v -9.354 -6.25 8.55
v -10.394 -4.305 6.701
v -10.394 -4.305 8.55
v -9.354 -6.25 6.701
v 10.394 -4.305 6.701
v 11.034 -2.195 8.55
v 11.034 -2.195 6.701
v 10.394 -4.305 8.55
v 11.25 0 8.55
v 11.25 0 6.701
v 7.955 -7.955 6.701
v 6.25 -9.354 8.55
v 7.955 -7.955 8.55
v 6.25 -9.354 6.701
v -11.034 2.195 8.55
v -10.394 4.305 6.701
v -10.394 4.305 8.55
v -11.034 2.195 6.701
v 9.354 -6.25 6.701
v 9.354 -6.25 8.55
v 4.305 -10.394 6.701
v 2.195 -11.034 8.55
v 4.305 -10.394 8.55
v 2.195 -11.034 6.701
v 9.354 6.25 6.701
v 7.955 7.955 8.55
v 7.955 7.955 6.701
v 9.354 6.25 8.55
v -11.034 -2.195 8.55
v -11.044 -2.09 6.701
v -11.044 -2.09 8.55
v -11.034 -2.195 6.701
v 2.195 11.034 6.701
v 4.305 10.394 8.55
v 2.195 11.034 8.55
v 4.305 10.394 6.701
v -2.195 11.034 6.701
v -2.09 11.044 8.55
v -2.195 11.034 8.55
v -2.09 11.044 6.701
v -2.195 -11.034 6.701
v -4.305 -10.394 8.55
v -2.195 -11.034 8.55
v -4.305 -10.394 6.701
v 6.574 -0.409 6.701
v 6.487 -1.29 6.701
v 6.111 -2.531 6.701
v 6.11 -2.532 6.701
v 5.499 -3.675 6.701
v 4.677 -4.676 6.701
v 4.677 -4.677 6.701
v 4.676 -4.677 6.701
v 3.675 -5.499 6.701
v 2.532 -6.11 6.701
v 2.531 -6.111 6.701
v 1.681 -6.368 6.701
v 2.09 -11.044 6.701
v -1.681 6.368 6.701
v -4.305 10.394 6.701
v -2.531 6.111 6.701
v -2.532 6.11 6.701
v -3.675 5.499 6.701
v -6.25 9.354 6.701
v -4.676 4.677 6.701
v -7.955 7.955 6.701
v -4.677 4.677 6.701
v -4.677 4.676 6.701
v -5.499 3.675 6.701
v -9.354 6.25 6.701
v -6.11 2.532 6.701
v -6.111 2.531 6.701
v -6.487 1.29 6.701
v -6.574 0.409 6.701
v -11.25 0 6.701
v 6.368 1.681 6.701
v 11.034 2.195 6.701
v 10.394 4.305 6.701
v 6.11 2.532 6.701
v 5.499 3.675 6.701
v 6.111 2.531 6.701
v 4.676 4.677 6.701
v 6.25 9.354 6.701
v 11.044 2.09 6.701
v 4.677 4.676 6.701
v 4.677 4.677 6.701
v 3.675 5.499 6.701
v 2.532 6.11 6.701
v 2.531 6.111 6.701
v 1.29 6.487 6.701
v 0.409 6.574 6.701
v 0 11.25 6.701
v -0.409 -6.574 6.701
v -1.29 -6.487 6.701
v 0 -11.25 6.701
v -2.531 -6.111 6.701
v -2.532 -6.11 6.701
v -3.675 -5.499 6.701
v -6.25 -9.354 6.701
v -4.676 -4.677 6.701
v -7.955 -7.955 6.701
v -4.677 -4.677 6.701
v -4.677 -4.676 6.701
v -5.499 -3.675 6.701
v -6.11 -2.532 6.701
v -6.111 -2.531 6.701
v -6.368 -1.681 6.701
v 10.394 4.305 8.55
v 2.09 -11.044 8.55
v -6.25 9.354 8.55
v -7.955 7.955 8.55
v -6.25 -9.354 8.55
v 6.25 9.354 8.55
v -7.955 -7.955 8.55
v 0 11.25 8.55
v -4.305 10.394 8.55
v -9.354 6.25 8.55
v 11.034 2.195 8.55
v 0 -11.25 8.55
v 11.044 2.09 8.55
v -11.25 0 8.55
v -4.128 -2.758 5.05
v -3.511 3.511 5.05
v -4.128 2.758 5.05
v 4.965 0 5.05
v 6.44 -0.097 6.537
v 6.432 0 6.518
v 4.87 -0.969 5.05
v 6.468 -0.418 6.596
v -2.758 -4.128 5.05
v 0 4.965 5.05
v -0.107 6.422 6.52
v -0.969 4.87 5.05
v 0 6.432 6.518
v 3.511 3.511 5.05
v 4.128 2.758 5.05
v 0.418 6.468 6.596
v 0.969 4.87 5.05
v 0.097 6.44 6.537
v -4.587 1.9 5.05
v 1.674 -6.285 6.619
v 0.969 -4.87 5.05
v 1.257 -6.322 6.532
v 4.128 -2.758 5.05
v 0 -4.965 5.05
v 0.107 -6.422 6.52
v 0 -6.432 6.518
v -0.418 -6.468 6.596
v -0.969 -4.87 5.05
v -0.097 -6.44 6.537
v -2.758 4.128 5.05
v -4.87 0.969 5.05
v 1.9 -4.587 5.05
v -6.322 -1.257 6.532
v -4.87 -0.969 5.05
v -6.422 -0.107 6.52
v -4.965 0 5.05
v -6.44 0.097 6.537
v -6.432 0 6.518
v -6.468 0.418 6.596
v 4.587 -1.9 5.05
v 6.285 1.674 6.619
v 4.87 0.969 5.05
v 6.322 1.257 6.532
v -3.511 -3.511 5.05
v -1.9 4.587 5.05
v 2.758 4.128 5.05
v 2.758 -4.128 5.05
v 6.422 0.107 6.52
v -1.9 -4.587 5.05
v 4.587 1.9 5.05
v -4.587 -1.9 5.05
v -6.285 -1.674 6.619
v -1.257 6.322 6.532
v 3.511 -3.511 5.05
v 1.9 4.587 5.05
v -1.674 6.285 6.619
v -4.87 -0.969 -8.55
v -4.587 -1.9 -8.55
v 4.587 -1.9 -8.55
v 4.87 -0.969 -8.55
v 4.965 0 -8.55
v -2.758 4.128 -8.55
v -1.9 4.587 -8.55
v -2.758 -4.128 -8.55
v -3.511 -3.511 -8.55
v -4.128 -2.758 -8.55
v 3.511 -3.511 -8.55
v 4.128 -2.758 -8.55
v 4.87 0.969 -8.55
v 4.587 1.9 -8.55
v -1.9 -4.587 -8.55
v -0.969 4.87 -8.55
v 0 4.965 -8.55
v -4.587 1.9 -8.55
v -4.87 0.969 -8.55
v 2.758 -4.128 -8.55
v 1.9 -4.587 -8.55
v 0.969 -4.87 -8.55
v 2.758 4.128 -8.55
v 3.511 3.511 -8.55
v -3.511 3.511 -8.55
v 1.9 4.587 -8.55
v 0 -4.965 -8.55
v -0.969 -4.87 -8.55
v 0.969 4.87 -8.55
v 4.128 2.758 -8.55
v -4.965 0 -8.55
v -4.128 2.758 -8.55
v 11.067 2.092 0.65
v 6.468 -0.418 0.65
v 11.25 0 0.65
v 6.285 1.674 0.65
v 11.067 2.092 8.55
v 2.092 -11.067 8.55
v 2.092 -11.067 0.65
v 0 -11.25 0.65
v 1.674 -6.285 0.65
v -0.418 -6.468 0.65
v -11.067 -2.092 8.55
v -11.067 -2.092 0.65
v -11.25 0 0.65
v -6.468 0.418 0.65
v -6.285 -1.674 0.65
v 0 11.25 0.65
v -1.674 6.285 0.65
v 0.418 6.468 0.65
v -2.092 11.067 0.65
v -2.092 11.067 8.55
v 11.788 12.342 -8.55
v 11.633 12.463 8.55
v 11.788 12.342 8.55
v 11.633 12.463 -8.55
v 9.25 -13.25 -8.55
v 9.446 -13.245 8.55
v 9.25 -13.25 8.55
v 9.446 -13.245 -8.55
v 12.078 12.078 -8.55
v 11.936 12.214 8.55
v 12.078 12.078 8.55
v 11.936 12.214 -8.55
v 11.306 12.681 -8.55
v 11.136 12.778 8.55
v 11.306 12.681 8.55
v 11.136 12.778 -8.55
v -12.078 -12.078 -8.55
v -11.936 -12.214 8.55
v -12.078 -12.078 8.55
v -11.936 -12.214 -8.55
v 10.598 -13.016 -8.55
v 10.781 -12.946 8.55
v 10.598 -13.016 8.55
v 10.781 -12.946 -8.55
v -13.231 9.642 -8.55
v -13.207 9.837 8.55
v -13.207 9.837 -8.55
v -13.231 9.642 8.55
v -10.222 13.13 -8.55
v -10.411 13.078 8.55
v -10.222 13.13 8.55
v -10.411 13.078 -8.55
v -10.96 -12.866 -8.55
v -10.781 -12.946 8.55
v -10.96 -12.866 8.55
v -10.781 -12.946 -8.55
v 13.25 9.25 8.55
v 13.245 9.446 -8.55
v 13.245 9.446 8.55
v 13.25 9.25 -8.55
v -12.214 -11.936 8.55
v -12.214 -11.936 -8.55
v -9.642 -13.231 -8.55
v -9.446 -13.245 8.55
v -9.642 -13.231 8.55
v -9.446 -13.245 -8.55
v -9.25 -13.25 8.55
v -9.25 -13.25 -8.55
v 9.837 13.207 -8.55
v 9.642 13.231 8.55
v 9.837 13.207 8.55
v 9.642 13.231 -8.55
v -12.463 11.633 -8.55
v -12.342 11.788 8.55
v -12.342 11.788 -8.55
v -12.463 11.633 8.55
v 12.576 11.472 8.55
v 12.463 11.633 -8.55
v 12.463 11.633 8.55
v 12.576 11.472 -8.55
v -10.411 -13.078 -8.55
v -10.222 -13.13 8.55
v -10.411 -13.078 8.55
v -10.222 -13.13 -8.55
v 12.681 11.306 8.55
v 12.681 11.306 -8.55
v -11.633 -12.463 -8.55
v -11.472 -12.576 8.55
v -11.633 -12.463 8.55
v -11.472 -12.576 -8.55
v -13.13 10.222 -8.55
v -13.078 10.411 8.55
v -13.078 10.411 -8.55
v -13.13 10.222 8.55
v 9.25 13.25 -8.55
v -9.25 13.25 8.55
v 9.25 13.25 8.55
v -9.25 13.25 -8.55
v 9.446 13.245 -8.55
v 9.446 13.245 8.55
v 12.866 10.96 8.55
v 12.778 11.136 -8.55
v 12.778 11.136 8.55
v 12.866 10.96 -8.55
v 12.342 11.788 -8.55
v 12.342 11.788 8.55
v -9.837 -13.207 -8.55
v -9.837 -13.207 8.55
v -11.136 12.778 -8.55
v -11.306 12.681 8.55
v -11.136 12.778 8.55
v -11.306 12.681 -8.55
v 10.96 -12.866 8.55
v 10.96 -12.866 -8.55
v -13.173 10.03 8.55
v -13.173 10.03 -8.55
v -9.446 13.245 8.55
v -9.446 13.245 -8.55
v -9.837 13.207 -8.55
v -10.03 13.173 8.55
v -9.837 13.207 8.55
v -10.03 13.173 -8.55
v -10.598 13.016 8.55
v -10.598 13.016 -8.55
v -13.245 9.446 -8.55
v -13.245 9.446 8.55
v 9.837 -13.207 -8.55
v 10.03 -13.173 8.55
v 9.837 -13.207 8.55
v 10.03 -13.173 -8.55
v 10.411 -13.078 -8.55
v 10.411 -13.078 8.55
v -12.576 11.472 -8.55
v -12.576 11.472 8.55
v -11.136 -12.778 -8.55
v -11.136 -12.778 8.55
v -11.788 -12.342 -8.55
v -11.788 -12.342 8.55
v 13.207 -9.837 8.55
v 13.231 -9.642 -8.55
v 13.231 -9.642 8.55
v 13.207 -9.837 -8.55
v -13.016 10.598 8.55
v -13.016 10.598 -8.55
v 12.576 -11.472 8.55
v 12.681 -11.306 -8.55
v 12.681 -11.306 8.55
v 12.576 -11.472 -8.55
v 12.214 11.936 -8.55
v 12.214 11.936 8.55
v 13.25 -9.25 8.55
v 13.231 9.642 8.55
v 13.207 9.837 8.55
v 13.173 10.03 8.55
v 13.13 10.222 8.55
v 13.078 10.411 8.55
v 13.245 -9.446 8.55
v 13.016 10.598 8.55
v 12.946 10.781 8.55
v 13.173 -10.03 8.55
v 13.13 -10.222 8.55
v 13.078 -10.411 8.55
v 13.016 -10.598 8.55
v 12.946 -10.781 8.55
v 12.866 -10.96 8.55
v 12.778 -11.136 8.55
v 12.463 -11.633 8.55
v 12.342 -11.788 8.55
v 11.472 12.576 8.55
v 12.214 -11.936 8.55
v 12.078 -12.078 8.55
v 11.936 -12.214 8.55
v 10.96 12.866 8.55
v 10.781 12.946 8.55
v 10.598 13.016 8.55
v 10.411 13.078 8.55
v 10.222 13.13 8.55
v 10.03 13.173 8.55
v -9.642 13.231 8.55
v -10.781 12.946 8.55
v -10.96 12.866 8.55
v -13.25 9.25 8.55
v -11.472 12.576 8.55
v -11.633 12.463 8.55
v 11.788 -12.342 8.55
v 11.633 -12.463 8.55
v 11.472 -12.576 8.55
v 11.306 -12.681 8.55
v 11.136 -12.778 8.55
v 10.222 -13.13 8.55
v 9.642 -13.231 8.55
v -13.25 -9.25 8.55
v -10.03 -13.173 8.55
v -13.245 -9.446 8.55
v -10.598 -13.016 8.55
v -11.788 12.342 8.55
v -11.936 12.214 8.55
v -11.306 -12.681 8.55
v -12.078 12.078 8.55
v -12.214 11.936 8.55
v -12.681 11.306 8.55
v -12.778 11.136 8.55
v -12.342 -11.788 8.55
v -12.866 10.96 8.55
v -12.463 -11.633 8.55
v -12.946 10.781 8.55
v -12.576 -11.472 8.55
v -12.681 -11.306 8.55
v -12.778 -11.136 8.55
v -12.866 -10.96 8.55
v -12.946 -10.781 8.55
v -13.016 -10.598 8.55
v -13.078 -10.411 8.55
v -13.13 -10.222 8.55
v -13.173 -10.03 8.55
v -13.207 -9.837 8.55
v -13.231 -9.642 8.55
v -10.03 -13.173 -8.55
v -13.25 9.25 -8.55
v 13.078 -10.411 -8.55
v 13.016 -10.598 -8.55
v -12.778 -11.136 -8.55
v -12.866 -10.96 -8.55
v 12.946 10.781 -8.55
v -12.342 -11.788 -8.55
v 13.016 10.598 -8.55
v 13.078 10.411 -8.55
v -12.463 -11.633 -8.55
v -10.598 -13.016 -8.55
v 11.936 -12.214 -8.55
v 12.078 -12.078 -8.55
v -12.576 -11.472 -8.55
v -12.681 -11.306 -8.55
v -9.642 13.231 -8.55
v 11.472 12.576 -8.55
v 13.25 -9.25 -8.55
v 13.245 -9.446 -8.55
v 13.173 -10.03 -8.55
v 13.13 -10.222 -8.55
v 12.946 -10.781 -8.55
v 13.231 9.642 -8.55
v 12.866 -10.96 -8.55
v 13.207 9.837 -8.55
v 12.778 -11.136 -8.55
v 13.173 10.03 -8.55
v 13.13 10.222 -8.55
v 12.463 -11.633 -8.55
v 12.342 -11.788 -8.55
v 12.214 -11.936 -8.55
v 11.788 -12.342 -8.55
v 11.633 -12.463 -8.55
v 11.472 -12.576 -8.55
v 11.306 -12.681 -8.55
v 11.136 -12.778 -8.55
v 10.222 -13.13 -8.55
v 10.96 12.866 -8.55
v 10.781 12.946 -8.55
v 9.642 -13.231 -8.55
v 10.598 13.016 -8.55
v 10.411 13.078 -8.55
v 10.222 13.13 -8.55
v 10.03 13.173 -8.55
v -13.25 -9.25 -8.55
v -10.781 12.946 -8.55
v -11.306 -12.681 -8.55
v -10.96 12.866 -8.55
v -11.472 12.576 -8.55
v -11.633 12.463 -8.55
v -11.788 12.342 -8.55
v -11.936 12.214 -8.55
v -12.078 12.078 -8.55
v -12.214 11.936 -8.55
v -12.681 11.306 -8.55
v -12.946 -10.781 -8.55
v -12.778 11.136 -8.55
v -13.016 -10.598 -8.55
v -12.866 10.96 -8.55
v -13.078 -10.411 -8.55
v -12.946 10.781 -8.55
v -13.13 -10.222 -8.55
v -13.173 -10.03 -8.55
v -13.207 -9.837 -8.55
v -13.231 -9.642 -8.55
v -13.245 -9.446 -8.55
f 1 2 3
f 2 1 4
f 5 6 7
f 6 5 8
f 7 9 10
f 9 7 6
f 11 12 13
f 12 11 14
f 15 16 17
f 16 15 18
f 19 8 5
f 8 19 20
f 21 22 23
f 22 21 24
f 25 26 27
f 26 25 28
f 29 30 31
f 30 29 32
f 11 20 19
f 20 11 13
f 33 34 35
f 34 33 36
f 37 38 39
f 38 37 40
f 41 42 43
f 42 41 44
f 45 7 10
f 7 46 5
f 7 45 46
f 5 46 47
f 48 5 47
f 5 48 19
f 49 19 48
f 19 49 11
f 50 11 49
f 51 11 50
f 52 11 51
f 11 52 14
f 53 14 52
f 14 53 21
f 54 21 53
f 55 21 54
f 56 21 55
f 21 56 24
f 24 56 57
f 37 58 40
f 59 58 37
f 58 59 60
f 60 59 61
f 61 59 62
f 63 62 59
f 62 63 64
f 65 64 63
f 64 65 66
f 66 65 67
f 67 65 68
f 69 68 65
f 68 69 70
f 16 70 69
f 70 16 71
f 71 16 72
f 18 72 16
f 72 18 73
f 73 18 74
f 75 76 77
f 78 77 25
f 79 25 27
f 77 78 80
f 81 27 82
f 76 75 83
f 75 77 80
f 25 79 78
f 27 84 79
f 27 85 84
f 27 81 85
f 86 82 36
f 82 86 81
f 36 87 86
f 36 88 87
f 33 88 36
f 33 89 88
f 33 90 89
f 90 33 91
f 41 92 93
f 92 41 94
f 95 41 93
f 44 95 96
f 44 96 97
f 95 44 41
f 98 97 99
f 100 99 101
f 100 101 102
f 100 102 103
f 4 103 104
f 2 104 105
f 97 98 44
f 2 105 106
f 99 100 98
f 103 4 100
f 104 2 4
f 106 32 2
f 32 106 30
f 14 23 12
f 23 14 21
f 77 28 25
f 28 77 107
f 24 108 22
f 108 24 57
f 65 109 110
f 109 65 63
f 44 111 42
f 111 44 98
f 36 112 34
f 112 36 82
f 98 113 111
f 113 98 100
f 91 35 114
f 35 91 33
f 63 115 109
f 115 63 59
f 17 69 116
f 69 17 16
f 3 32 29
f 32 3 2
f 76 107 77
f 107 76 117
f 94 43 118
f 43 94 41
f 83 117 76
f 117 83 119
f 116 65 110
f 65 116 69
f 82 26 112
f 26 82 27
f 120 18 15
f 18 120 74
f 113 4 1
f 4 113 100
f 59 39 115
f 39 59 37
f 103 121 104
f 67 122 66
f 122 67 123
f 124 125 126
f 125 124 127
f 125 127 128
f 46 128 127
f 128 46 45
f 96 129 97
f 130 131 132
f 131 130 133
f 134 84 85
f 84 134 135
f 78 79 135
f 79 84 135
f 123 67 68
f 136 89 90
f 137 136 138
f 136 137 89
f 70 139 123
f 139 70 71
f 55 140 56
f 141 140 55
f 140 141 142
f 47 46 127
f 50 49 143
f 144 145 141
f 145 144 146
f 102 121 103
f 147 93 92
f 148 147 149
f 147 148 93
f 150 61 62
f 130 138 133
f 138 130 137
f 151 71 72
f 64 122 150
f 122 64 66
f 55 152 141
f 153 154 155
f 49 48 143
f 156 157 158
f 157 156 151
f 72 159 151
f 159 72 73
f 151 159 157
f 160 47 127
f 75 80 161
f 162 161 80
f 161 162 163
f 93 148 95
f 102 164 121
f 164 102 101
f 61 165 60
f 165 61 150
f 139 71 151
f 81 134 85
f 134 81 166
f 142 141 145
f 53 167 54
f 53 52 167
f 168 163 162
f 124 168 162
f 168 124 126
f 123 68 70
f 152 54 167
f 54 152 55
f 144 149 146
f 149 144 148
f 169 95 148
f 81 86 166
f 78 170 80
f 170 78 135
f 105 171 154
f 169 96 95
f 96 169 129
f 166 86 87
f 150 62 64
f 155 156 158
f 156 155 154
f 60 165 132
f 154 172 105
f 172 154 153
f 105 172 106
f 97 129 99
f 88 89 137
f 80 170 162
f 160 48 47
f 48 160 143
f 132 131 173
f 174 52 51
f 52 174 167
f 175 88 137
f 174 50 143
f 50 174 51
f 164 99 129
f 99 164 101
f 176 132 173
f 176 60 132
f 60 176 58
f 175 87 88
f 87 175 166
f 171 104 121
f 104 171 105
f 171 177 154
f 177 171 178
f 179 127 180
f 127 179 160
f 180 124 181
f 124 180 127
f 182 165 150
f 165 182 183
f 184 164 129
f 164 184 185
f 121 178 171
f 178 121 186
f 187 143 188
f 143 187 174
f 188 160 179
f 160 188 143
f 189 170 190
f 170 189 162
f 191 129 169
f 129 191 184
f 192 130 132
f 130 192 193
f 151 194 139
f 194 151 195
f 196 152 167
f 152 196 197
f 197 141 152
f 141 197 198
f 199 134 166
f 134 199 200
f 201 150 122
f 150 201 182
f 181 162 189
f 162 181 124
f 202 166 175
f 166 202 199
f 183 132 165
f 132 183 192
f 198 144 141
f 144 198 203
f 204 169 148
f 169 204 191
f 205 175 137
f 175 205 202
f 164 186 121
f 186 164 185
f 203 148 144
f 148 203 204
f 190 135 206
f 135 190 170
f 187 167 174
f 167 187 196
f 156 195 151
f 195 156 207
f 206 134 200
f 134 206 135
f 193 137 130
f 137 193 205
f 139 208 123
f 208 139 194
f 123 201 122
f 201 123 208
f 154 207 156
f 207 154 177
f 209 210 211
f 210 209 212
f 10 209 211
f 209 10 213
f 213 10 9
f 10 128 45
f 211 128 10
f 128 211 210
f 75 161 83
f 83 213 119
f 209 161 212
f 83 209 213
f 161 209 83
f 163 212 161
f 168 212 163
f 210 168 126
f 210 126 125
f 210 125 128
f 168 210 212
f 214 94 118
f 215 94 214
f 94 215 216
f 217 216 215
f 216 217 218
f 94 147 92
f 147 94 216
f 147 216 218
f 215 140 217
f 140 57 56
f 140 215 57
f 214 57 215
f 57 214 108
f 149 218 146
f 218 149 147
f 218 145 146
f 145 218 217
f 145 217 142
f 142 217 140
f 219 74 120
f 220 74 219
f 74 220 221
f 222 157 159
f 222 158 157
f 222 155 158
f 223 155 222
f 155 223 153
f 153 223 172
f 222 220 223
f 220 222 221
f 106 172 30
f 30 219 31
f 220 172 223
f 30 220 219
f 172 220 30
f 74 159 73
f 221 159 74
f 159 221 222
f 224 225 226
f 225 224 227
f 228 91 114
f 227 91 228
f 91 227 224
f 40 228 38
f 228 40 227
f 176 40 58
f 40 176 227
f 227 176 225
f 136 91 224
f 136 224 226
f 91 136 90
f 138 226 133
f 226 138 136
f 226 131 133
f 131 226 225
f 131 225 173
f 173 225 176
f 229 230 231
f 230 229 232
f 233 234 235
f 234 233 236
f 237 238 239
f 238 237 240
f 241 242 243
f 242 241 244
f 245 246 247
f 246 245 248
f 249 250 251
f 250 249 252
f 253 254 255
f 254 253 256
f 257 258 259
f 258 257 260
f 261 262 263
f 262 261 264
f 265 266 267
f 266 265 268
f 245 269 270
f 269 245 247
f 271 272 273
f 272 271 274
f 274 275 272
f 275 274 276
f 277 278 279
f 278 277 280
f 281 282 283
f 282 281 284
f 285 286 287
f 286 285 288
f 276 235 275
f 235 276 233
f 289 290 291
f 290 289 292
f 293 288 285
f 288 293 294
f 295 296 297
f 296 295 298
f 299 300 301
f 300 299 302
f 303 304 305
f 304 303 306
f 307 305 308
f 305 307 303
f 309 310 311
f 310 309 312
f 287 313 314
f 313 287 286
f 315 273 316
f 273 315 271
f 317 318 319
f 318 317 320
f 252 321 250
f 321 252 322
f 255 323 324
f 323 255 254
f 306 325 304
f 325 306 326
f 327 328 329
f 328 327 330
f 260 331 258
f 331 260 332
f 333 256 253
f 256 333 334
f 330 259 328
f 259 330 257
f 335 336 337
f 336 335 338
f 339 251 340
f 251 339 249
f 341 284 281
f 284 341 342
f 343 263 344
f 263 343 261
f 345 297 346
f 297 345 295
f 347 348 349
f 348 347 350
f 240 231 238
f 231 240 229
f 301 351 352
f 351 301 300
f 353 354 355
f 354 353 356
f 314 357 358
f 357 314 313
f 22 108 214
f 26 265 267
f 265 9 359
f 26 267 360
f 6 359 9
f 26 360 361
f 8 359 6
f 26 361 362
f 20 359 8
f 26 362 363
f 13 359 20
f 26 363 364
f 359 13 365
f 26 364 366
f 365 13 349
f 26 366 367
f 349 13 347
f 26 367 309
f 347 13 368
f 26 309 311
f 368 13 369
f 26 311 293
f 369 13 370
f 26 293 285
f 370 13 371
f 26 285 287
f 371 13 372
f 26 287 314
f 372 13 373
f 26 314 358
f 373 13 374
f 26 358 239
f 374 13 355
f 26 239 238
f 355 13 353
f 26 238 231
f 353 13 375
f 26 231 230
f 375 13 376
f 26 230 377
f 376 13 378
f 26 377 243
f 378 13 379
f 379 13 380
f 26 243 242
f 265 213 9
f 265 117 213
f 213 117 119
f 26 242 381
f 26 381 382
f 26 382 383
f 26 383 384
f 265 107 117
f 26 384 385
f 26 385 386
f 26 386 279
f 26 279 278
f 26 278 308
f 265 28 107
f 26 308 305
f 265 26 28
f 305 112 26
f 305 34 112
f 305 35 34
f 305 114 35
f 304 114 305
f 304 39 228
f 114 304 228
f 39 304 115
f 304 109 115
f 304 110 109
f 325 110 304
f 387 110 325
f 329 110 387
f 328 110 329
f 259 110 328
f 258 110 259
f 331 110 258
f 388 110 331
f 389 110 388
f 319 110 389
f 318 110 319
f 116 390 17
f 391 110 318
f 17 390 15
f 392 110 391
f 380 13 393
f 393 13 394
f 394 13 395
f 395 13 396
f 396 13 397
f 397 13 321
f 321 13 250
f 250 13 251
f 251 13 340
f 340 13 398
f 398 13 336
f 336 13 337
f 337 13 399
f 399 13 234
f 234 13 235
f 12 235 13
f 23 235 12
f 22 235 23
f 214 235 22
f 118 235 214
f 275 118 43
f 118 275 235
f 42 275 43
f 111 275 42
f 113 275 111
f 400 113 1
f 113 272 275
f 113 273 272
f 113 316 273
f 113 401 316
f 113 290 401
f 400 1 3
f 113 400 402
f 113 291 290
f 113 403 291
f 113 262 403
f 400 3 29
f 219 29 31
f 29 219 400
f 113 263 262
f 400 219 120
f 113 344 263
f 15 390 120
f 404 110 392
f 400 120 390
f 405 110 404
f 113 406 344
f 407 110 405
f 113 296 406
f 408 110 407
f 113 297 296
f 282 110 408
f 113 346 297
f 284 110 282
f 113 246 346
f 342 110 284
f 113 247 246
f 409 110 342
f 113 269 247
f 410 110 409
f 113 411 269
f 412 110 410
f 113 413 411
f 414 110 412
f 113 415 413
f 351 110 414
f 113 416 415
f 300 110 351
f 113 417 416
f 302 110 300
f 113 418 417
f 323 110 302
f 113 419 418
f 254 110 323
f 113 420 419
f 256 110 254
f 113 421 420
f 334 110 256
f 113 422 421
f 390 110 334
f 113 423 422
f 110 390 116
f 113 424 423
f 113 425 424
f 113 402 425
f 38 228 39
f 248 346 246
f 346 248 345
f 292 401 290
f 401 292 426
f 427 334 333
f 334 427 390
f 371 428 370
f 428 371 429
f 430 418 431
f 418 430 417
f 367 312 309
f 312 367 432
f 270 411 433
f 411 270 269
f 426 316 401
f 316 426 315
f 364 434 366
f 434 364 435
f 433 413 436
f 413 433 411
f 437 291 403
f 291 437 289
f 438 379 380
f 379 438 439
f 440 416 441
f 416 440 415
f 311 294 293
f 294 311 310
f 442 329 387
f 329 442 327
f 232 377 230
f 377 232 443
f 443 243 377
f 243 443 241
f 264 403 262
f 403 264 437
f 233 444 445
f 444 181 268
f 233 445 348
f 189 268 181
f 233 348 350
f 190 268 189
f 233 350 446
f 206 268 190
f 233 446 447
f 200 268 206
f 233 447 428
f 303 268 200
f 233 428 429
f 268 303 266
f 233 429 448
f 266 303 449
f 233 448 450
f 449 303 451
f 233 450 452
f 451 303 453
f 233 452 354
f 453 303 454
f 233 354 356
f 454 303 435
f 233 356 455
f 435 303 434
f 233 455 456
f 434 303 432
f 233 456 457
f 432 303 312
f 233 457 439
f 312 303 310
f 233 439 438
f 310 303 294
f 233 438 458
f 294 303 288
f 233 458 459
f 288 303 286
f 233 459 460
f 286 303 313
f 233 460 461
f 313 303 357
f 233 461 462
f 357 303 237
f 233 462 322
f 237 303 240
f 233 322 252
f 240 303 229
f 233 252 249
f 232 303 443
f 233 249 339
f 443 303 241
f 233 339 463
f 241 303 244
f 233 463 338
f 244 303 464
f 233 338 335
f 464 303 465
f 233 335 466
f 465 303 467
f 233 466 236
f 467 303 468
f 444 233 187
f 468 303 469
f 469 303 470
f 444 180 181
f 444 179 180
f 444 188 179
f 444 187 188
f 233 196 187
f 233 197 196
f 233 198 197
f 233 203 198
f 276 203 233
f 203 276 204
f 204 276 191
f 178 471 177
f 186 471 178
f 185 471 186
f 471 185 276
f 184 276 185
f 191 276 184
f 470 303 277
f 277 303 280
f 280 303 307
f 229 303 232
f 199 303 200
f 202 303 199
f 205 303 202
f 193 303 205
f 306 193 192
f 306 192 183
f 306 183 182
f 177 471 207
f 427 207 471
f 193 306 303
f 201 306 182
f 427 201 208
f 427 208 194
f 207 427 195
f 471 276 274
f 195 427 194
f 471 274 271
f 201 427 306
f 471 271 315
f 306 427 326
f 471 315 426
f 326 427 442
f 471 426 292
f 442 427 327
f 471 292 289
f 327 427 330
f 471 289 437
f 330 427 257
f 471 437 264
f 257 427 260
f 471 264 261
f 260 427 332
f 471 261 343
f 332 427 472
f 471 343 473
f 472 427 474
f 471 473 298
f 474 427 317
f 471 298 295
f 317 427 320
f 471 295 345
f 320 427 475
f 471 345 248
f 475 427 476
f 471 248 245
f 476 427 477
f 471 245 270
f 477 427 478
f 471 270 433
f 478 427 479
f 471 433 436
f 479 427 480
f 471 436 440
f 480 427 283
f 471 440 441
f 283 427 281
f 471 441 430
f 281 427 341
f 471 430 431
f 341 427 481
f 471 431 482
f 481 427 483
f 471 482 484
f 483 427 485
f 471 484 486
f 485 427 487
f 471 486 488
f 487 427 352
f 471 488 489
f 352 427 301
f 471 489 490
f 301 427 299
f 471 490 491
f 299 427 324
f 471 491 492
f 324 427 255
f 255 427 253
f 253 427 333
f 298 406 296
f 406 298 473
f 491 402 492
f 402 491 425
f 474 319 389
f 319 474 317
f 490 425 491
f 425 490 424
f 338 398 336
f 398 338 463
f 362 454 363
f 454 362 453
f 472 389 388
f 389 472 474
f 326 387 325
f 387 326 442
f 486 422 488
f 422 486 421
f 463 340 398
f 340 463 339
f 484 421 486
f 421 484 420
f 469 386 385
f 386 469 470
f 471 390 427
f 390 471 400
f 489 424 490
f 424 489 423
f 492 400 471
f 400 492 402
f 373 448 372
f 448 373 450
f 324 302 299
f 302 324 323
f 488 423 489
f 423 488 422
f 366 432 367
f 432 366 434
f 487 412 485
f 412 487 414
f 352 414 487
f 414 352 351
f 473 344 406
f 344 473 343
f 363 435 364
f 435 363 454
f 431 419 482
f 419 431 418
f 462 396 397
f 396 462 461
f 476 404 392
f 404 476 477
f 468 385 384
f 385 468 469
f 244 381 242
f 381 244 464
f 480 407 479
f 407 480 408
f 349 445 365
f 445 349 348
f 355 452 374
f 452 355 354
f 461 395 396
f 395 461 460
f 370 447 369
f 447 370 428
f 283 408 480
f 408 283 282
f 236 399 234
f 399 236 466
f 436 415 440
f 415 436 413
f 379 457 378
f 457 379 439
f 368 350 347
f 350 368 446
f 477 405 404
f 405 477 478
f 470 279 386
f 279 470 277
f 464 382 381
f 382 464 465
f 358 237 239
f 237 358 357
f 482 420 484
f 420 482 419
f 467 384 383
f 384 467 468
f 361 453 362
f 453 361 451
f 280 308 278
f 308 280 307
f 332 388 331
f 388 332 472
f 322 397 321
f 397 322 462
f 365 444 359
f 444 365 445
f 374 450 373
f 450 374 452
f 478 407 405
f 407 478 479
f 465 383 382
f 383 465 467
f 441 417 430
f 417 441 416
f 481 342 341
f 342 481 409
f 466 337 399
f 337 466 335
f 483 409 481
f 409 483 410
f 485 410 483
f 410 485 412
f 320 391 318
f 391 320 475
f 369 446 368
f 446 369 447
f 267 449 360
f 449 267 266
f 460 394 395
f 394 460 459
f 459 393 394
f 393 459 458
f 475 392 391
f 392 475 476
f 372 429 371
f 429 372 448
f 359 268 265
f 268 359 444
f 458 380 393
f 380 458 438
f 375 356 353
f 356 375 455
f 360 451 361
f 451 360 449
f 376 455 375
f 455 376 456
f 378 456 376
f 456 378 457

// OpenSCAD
// Start: lazy_union
default_5_default_5();
// End: lazy_union

// Modules.

// 'PartMaterial undef-default - default 5.0'
module default_5_default_5() {
  // 'None : _combine_solids_and_holes'
  union() {
    // '_combine_solids_and_holes'
    difference() {
      // 'M8 : _combine_solids_and_holes'
      union() {
        // 'model : _combine_solids_and_holes'
        union() {
          // 'hull'
          multmatrix(m=[[1.0, 0.0, 0.0, -13.25], [0.0, 1.0, 0.0, -13.25], [0.0, 0.0, 1.0, -8.55], [0.0, 0.0, 0.0, 1.0]]) {
            // 'hull : _combine_solids_and_holes'
            union() {
              // 'hull'
              linear_extrude(height=17.1, twist=0.0, slices=4, scale=[1.0, 1.0]) {
                polygon(points=[[4.0, 0.0], [22.5, 0.0], [22.69627069730967, 0.00481817517931038], [22.892068561318244, 0.01926109331121273], [23.086921897821448, 0.043293960140876386], [23.280361288064512, 0.07685887838707872], [23.471920719613056, 0.11987498722182455], [23.661138709017848, 0.17223865707116515], [23.84755941356888, 0.2338237392679181], [24.03073372946036, 0.3044818699548544], [24.21022037372113, 0.38404282750622754], [24.38558694730399, 0.47231494260658113], [24.556410976772888, 0.5690855599989124], [24.72228093207841, 0.6741215507898204], [24.88279721796973, 0.7871698740774216], [25.03757313665458, 0.9079581865490534], [25.186235819388074, 1.036195498580165], [25.328427124746188, 1.171572875253811], [25.463804501419837, 1.3137641806119271], [25.592041813450948, 1.4624268633454194], [25.71283012592258, 1.6172027820302675], [25.82587844921018, 1.7777190679215917], [25.93091444000109, 1.9435890232271142], [26.02768505739342, 2.11441305269601], [26.115957172493772, 2.2897796262788725], [26.195518130045148, 2.469266270539641], [26.26617626073208, 2.6524405864311205], [26.327761342928834, 2.838861290982151], [26.380125012778176, 3.0280792803869447], [26.42314112161292, 3.2196387119354872], [26.456706039859125, 3.4130781021785532], [26.48073890668879, 3.607931438681758], [26.49518182482069, 3.8037293026903285], [26.5, 4.0], [26.5, 22.5], [26.49518182482069, 22.69627069730967], [26.48073890668879, 22.892068561318244], [26.456706039859125, 23.086921897821448], [26.42314112161292, 23.280361288064512], [26.380125012778176, 23.471920719613056], [26.327761342928834, 23.661138709017848], [26.26617626073208, 23.84755941356888], [26.195518130045144, 24.03073372946036], [26.115957172493772, 24.21022037372113], [26.02768505739342, 24.38558694730399], [25.930914440001086, 24.556410976772888], [25.82587844921018, 24.72228093207841], [25.71283012592258, 24.88279721796973], [25.592041813450948, 25.03757313665458], [25.463804501419837, 25.186235819388074], [25.328427124746188, 25.328427124746188], [25.186235819388074, 25.463804501419837], [25.03757313665458, 25.592041813450948], [24.88279721796973, 25.71283012592258], [24.72228093207841, 25.82587844921018], [24.556410976772888, 25.930914440001086], [24.38558694730399, 26.02768505739342], [24.21022037372113, 26.115957172493772], [24.03073372946036, 26.195518130045144], [23.84755941356888, 26.26617626073208], [23.661138709017848, 26.327761342928834], [23.471920719613056, 26.380125012778176], [23.280361288064512, 26.42314112161292], [23.086921897821448, 26.456706039859125], [22.892068561318244, 26.48073890668879], [22.69627069730967, 26.49518182482069], [22.5, 26.5], [4.0, 26.5], [3.8037293026903276, 26.49518182482069], [3.607931438681758, 26.48073890668879], [3.413078102178553, 26.456706039859125], [3.2196387119354872, 26.42314112161292], [3.0280792803869447, 26.380125012778176], [2.83886129098215, 26.327761342928834], [2.65244058643112, 26.266176260732085], [2.4692662705396407, 26.195518130045148], [2.2897796262788708, 26.115957172493772], [2.114413052696009, 26.02768505739342], [1.943589023227112, 25.93091444000109], [1.7777190679215904, 25.82587844921018], [1.6172027820302661, 25.71283012592258], [1.4624268633454176, 25.592041813450948], [1.3137641806119253, 25.463804501419837], [1.1715728752538088, 25.32842712474619], [1.0361954985801631, 25.186235819388074], [0.9079581865490507, 25.037573136654583], [0.7871698740774189, 24.882797217969735], [0.6741215507898177, 24.72228093207841], [0.5690855599989106, 24.556410976772888], [0.472314942606578, 24.38558694730399], [0.38404282750622487, 24.21022037372113], [0.3044818699548508, 24.03073372946036], [0.2338237392679141, 23.84755941356888], [0.17223865707116204, 23.66113870901785], [0.11987498722182144, 23.471920719613056], [0.07685887838707517, 23.280361288064512], [0.04329396014087328, 23.086921897821448], [0.019261093311209176, 22.892068561318244], [0.004818175179306827, 22.69627069730967], [-3.552713678800501e-15, 22.5], [0.0, 4.0], [0.00481817517931038, 3.803729302690329], [0.019261093311212285, 3.607931438681758], [0.04329396014087594, 3.4130781021785537], [0.07685887838707828, 3.2196387119354863], [0.1198749872218241, 3.0280792803869447], [0.17223865707116426, 2.838861290982152], [0.23382373926791677, 2.6524405864311196], [0.3044818699548526, 2.4692662705396415], [0.3840428275062262, 2.2897796262788725], [0.4723149426065798, 2.114413052696009], [0.5690855599989115, 1.9435890232271138], [0.6741215507898182, 1.7777190679215922], [0.7871698740774202, 1.617202782030267], [0.9079581865490516, 1.462426863345419], [1.0361954985801636, 1.3137641806119262], [1.1715728752538093, 1.1715728752538102], [1.3137641806119253, 1.0361954985801645], [1.4624268633454163, 0.9079581865490534], [1.6172027820302675, 0.7871698740774198], [1.7777190679215913, 0.6741215507898191], [1.943589023227113, 0.569085559998912], [2.1144130526960083, 0.47231494260658025], [2.28977962627887, 0.38404282750622754], [2.469266270539639, 0.30448186995485393], [2.65244058643112, 0.23382373926791677], [2.83886129098215, 0.1722386570711647], [3.0280792803869434, 0.1198749872218241], [3.2196387119354855, 0.07685887838707872], [3.413078102178554, 0.04329396014087594], [3.6079314386817583, 0.019261093311212285], [3.803729302690328, 0.00481817517931038]]);
              }
            }
          }
        }
      }
      // 'M8'
      multmatrix(m=[[1.0, 0.0, 0.0, 0.0], [0.0, 1.0, 0.0, 0.0], [0.0, 0.0, 1.0, 0.0009999999999994458], [0.0, 0.0, 0.0, 1.0]]) {
        // 'tnut : _combine_solids_and_holes'
        union() {
          // 'tnut'
          multmatrix(m=[[1.0, 0.0, 0.0, 0.0], [0.0, 1.0, 0.0, 0.0], [0.0, 0.0, 1.0, 8.55], [0.0, 0.0, 0.0, 1.0]]) {
            // 'tnut : _combine_solids_and_holes'
            union() {
              // 'flat'
              multmatrix(m=[[1.0, 0.0, 0.0, 0.0], [0.0, -1.0, 0.0, 0.0], [0.0, 0.0, -1.0, 0.0], [0.0, 0.0, 0.0, 1.0]]) {
                // 'flat : _combine_solids_and_holes'
                union() {
                  // 'flat'
                  cylinder(h=1.85, r1=11.25, r2=11.25, center=false, $fn=32);
                }
              }
              // 'bevel'
              multmatrix(m=[[1.0, 0.0, 0.0, 0.0], [0.0, -1.0, 0.0, 0.0], [0.0, 0.0, -1.0, -1.8490000000000002], [0.0, 0.0, 0.0, 1.0]]) {
                // 'bevel : _combine_solids_and_holes'
                union() {
                  // 'bevel'
                  cylinder(h=1.6519999999999997, r1=6.614999999999999, r2=4.965, center=false, $fn=32);
                }
              }
              // 'shaft'
              multmatrix(m=[[1.0, 0.0, 0.0, 0.0], [0.0, -1.0, 0.0, 0.0], [0.0, 0.0, -1.0, -3.5], [0.0, 0.0, 0.0, 1.0]]) {
                // 'shaft : _combine_solids_and_holes'
                union() {
                  // 'shaft'
                  cylinder(h=13.600000000000001, r1=4.965, r2=4.965, center=false, $fn=32);
                }
              }
              // 'shaft_extension'
              multmatrix(m=[[1.0, 0.0, 0.0, 0.0], [0.0, -1.0, 0.0, 0.0], [0.0, 0.0, -1.0, -17.099000000000004], [0.0, 0.0, 0.0, 1.0]]) {
                // 'shaft_extension'
                color(c=[1.0, 0.0, 0.0, 1.0]) {
                  // 'shaft_extension : _combine_solids_and_holes'
                  union() {
                    // 'shaft_extension'
                    cylinder(h=30.0, r1=4.965, r2=4.965, center=false, $fn=32);
                  }
                }
              }
              // ('wing', 0)
              multmatrix(m=[[-0.9961946980917455, -0.08715574274765814, 0.0, 11.25], [-0.08715574274765814, 0.9961946980917455, 0.0, 0.0], [0.0, 0.0, -1.0, -0.001], [0.0, 0.0, 0.0, 1.0]]) {
                // ('wing', 0)
                color(c=[1.0, 0.0, 1.0, 1.0]) {
                  // "('wing', 0) : _combine_solids_and_holes"
                  union() {
                    // ('wing', 0)
                    cube(size=[4.8, 2.1, 7.9]);
                  }
                }
              }
              // ('wing', 1)
              multmatrix(m=[[-0.08715574274765814, 0.9961946980917455, 0.0, 0.0], [0.9961946980917455, 0.08715574274765814, 0.0, -11.25], [0.0, 0.0, -1.0, -0.001], [0.0, 0.0, 0.0, 1.0]]) {
                // ('wing', 1)
                color(c=[1.0, 0.0, 1.0, 1.0]) {
                  // "('wing', 1) : _combine_solids_and_holes"
                  union() {
                    // ('wing', 1)
                    cube(size=[4.8, 2.1, 7.9]);
                  }
                }
              }
              // ('wing', 2)
              multmatrix(m=[[0.9961946980917455, 0.08715574274765814, 0.0, -11.25], [0.08715574274765814, -0.9961946980917455, 0.0, 0.0], [0.0, 0.0, -1.0, -0.001], [0.0, 0.0, 0.0, 1.0]]) {
                // ('wing', 2)
                color(c=[1.0, 0.0, 1.0, 1.0]) {
                  // "('wing', 2) : _combine_solids_and_holes"
                  union() {
                    // ('wing', 2)
                    cube(size=[4.8, 2.1, 7.9]);
                  }
                }
              }
              // ('wing', 3)
              multmatrix(m=[[0.08715574274765814, -0.9961946980917455, 0.0, 0.0], [-0.9961946980917455, -0.08715574274765814, 0.0, 11.25], [0.0, 0.0, -1.0, -0.001], [0.0, 0.0, 0.0, 1.0]]) {
                // ('wing', 3)
                color(c=[1.0, 0.0, 1.0, 1.0]) {
                  // "('wing', 3) : _combine_solids_and_holes"
                  union() {
                    // ('wing', 3)
                    cube(size=[4.8, 2.1, 7.9]);
                  }
                }
              }
            }
          }
        }
      }
    }
  }
} // end module default_5_default_5
